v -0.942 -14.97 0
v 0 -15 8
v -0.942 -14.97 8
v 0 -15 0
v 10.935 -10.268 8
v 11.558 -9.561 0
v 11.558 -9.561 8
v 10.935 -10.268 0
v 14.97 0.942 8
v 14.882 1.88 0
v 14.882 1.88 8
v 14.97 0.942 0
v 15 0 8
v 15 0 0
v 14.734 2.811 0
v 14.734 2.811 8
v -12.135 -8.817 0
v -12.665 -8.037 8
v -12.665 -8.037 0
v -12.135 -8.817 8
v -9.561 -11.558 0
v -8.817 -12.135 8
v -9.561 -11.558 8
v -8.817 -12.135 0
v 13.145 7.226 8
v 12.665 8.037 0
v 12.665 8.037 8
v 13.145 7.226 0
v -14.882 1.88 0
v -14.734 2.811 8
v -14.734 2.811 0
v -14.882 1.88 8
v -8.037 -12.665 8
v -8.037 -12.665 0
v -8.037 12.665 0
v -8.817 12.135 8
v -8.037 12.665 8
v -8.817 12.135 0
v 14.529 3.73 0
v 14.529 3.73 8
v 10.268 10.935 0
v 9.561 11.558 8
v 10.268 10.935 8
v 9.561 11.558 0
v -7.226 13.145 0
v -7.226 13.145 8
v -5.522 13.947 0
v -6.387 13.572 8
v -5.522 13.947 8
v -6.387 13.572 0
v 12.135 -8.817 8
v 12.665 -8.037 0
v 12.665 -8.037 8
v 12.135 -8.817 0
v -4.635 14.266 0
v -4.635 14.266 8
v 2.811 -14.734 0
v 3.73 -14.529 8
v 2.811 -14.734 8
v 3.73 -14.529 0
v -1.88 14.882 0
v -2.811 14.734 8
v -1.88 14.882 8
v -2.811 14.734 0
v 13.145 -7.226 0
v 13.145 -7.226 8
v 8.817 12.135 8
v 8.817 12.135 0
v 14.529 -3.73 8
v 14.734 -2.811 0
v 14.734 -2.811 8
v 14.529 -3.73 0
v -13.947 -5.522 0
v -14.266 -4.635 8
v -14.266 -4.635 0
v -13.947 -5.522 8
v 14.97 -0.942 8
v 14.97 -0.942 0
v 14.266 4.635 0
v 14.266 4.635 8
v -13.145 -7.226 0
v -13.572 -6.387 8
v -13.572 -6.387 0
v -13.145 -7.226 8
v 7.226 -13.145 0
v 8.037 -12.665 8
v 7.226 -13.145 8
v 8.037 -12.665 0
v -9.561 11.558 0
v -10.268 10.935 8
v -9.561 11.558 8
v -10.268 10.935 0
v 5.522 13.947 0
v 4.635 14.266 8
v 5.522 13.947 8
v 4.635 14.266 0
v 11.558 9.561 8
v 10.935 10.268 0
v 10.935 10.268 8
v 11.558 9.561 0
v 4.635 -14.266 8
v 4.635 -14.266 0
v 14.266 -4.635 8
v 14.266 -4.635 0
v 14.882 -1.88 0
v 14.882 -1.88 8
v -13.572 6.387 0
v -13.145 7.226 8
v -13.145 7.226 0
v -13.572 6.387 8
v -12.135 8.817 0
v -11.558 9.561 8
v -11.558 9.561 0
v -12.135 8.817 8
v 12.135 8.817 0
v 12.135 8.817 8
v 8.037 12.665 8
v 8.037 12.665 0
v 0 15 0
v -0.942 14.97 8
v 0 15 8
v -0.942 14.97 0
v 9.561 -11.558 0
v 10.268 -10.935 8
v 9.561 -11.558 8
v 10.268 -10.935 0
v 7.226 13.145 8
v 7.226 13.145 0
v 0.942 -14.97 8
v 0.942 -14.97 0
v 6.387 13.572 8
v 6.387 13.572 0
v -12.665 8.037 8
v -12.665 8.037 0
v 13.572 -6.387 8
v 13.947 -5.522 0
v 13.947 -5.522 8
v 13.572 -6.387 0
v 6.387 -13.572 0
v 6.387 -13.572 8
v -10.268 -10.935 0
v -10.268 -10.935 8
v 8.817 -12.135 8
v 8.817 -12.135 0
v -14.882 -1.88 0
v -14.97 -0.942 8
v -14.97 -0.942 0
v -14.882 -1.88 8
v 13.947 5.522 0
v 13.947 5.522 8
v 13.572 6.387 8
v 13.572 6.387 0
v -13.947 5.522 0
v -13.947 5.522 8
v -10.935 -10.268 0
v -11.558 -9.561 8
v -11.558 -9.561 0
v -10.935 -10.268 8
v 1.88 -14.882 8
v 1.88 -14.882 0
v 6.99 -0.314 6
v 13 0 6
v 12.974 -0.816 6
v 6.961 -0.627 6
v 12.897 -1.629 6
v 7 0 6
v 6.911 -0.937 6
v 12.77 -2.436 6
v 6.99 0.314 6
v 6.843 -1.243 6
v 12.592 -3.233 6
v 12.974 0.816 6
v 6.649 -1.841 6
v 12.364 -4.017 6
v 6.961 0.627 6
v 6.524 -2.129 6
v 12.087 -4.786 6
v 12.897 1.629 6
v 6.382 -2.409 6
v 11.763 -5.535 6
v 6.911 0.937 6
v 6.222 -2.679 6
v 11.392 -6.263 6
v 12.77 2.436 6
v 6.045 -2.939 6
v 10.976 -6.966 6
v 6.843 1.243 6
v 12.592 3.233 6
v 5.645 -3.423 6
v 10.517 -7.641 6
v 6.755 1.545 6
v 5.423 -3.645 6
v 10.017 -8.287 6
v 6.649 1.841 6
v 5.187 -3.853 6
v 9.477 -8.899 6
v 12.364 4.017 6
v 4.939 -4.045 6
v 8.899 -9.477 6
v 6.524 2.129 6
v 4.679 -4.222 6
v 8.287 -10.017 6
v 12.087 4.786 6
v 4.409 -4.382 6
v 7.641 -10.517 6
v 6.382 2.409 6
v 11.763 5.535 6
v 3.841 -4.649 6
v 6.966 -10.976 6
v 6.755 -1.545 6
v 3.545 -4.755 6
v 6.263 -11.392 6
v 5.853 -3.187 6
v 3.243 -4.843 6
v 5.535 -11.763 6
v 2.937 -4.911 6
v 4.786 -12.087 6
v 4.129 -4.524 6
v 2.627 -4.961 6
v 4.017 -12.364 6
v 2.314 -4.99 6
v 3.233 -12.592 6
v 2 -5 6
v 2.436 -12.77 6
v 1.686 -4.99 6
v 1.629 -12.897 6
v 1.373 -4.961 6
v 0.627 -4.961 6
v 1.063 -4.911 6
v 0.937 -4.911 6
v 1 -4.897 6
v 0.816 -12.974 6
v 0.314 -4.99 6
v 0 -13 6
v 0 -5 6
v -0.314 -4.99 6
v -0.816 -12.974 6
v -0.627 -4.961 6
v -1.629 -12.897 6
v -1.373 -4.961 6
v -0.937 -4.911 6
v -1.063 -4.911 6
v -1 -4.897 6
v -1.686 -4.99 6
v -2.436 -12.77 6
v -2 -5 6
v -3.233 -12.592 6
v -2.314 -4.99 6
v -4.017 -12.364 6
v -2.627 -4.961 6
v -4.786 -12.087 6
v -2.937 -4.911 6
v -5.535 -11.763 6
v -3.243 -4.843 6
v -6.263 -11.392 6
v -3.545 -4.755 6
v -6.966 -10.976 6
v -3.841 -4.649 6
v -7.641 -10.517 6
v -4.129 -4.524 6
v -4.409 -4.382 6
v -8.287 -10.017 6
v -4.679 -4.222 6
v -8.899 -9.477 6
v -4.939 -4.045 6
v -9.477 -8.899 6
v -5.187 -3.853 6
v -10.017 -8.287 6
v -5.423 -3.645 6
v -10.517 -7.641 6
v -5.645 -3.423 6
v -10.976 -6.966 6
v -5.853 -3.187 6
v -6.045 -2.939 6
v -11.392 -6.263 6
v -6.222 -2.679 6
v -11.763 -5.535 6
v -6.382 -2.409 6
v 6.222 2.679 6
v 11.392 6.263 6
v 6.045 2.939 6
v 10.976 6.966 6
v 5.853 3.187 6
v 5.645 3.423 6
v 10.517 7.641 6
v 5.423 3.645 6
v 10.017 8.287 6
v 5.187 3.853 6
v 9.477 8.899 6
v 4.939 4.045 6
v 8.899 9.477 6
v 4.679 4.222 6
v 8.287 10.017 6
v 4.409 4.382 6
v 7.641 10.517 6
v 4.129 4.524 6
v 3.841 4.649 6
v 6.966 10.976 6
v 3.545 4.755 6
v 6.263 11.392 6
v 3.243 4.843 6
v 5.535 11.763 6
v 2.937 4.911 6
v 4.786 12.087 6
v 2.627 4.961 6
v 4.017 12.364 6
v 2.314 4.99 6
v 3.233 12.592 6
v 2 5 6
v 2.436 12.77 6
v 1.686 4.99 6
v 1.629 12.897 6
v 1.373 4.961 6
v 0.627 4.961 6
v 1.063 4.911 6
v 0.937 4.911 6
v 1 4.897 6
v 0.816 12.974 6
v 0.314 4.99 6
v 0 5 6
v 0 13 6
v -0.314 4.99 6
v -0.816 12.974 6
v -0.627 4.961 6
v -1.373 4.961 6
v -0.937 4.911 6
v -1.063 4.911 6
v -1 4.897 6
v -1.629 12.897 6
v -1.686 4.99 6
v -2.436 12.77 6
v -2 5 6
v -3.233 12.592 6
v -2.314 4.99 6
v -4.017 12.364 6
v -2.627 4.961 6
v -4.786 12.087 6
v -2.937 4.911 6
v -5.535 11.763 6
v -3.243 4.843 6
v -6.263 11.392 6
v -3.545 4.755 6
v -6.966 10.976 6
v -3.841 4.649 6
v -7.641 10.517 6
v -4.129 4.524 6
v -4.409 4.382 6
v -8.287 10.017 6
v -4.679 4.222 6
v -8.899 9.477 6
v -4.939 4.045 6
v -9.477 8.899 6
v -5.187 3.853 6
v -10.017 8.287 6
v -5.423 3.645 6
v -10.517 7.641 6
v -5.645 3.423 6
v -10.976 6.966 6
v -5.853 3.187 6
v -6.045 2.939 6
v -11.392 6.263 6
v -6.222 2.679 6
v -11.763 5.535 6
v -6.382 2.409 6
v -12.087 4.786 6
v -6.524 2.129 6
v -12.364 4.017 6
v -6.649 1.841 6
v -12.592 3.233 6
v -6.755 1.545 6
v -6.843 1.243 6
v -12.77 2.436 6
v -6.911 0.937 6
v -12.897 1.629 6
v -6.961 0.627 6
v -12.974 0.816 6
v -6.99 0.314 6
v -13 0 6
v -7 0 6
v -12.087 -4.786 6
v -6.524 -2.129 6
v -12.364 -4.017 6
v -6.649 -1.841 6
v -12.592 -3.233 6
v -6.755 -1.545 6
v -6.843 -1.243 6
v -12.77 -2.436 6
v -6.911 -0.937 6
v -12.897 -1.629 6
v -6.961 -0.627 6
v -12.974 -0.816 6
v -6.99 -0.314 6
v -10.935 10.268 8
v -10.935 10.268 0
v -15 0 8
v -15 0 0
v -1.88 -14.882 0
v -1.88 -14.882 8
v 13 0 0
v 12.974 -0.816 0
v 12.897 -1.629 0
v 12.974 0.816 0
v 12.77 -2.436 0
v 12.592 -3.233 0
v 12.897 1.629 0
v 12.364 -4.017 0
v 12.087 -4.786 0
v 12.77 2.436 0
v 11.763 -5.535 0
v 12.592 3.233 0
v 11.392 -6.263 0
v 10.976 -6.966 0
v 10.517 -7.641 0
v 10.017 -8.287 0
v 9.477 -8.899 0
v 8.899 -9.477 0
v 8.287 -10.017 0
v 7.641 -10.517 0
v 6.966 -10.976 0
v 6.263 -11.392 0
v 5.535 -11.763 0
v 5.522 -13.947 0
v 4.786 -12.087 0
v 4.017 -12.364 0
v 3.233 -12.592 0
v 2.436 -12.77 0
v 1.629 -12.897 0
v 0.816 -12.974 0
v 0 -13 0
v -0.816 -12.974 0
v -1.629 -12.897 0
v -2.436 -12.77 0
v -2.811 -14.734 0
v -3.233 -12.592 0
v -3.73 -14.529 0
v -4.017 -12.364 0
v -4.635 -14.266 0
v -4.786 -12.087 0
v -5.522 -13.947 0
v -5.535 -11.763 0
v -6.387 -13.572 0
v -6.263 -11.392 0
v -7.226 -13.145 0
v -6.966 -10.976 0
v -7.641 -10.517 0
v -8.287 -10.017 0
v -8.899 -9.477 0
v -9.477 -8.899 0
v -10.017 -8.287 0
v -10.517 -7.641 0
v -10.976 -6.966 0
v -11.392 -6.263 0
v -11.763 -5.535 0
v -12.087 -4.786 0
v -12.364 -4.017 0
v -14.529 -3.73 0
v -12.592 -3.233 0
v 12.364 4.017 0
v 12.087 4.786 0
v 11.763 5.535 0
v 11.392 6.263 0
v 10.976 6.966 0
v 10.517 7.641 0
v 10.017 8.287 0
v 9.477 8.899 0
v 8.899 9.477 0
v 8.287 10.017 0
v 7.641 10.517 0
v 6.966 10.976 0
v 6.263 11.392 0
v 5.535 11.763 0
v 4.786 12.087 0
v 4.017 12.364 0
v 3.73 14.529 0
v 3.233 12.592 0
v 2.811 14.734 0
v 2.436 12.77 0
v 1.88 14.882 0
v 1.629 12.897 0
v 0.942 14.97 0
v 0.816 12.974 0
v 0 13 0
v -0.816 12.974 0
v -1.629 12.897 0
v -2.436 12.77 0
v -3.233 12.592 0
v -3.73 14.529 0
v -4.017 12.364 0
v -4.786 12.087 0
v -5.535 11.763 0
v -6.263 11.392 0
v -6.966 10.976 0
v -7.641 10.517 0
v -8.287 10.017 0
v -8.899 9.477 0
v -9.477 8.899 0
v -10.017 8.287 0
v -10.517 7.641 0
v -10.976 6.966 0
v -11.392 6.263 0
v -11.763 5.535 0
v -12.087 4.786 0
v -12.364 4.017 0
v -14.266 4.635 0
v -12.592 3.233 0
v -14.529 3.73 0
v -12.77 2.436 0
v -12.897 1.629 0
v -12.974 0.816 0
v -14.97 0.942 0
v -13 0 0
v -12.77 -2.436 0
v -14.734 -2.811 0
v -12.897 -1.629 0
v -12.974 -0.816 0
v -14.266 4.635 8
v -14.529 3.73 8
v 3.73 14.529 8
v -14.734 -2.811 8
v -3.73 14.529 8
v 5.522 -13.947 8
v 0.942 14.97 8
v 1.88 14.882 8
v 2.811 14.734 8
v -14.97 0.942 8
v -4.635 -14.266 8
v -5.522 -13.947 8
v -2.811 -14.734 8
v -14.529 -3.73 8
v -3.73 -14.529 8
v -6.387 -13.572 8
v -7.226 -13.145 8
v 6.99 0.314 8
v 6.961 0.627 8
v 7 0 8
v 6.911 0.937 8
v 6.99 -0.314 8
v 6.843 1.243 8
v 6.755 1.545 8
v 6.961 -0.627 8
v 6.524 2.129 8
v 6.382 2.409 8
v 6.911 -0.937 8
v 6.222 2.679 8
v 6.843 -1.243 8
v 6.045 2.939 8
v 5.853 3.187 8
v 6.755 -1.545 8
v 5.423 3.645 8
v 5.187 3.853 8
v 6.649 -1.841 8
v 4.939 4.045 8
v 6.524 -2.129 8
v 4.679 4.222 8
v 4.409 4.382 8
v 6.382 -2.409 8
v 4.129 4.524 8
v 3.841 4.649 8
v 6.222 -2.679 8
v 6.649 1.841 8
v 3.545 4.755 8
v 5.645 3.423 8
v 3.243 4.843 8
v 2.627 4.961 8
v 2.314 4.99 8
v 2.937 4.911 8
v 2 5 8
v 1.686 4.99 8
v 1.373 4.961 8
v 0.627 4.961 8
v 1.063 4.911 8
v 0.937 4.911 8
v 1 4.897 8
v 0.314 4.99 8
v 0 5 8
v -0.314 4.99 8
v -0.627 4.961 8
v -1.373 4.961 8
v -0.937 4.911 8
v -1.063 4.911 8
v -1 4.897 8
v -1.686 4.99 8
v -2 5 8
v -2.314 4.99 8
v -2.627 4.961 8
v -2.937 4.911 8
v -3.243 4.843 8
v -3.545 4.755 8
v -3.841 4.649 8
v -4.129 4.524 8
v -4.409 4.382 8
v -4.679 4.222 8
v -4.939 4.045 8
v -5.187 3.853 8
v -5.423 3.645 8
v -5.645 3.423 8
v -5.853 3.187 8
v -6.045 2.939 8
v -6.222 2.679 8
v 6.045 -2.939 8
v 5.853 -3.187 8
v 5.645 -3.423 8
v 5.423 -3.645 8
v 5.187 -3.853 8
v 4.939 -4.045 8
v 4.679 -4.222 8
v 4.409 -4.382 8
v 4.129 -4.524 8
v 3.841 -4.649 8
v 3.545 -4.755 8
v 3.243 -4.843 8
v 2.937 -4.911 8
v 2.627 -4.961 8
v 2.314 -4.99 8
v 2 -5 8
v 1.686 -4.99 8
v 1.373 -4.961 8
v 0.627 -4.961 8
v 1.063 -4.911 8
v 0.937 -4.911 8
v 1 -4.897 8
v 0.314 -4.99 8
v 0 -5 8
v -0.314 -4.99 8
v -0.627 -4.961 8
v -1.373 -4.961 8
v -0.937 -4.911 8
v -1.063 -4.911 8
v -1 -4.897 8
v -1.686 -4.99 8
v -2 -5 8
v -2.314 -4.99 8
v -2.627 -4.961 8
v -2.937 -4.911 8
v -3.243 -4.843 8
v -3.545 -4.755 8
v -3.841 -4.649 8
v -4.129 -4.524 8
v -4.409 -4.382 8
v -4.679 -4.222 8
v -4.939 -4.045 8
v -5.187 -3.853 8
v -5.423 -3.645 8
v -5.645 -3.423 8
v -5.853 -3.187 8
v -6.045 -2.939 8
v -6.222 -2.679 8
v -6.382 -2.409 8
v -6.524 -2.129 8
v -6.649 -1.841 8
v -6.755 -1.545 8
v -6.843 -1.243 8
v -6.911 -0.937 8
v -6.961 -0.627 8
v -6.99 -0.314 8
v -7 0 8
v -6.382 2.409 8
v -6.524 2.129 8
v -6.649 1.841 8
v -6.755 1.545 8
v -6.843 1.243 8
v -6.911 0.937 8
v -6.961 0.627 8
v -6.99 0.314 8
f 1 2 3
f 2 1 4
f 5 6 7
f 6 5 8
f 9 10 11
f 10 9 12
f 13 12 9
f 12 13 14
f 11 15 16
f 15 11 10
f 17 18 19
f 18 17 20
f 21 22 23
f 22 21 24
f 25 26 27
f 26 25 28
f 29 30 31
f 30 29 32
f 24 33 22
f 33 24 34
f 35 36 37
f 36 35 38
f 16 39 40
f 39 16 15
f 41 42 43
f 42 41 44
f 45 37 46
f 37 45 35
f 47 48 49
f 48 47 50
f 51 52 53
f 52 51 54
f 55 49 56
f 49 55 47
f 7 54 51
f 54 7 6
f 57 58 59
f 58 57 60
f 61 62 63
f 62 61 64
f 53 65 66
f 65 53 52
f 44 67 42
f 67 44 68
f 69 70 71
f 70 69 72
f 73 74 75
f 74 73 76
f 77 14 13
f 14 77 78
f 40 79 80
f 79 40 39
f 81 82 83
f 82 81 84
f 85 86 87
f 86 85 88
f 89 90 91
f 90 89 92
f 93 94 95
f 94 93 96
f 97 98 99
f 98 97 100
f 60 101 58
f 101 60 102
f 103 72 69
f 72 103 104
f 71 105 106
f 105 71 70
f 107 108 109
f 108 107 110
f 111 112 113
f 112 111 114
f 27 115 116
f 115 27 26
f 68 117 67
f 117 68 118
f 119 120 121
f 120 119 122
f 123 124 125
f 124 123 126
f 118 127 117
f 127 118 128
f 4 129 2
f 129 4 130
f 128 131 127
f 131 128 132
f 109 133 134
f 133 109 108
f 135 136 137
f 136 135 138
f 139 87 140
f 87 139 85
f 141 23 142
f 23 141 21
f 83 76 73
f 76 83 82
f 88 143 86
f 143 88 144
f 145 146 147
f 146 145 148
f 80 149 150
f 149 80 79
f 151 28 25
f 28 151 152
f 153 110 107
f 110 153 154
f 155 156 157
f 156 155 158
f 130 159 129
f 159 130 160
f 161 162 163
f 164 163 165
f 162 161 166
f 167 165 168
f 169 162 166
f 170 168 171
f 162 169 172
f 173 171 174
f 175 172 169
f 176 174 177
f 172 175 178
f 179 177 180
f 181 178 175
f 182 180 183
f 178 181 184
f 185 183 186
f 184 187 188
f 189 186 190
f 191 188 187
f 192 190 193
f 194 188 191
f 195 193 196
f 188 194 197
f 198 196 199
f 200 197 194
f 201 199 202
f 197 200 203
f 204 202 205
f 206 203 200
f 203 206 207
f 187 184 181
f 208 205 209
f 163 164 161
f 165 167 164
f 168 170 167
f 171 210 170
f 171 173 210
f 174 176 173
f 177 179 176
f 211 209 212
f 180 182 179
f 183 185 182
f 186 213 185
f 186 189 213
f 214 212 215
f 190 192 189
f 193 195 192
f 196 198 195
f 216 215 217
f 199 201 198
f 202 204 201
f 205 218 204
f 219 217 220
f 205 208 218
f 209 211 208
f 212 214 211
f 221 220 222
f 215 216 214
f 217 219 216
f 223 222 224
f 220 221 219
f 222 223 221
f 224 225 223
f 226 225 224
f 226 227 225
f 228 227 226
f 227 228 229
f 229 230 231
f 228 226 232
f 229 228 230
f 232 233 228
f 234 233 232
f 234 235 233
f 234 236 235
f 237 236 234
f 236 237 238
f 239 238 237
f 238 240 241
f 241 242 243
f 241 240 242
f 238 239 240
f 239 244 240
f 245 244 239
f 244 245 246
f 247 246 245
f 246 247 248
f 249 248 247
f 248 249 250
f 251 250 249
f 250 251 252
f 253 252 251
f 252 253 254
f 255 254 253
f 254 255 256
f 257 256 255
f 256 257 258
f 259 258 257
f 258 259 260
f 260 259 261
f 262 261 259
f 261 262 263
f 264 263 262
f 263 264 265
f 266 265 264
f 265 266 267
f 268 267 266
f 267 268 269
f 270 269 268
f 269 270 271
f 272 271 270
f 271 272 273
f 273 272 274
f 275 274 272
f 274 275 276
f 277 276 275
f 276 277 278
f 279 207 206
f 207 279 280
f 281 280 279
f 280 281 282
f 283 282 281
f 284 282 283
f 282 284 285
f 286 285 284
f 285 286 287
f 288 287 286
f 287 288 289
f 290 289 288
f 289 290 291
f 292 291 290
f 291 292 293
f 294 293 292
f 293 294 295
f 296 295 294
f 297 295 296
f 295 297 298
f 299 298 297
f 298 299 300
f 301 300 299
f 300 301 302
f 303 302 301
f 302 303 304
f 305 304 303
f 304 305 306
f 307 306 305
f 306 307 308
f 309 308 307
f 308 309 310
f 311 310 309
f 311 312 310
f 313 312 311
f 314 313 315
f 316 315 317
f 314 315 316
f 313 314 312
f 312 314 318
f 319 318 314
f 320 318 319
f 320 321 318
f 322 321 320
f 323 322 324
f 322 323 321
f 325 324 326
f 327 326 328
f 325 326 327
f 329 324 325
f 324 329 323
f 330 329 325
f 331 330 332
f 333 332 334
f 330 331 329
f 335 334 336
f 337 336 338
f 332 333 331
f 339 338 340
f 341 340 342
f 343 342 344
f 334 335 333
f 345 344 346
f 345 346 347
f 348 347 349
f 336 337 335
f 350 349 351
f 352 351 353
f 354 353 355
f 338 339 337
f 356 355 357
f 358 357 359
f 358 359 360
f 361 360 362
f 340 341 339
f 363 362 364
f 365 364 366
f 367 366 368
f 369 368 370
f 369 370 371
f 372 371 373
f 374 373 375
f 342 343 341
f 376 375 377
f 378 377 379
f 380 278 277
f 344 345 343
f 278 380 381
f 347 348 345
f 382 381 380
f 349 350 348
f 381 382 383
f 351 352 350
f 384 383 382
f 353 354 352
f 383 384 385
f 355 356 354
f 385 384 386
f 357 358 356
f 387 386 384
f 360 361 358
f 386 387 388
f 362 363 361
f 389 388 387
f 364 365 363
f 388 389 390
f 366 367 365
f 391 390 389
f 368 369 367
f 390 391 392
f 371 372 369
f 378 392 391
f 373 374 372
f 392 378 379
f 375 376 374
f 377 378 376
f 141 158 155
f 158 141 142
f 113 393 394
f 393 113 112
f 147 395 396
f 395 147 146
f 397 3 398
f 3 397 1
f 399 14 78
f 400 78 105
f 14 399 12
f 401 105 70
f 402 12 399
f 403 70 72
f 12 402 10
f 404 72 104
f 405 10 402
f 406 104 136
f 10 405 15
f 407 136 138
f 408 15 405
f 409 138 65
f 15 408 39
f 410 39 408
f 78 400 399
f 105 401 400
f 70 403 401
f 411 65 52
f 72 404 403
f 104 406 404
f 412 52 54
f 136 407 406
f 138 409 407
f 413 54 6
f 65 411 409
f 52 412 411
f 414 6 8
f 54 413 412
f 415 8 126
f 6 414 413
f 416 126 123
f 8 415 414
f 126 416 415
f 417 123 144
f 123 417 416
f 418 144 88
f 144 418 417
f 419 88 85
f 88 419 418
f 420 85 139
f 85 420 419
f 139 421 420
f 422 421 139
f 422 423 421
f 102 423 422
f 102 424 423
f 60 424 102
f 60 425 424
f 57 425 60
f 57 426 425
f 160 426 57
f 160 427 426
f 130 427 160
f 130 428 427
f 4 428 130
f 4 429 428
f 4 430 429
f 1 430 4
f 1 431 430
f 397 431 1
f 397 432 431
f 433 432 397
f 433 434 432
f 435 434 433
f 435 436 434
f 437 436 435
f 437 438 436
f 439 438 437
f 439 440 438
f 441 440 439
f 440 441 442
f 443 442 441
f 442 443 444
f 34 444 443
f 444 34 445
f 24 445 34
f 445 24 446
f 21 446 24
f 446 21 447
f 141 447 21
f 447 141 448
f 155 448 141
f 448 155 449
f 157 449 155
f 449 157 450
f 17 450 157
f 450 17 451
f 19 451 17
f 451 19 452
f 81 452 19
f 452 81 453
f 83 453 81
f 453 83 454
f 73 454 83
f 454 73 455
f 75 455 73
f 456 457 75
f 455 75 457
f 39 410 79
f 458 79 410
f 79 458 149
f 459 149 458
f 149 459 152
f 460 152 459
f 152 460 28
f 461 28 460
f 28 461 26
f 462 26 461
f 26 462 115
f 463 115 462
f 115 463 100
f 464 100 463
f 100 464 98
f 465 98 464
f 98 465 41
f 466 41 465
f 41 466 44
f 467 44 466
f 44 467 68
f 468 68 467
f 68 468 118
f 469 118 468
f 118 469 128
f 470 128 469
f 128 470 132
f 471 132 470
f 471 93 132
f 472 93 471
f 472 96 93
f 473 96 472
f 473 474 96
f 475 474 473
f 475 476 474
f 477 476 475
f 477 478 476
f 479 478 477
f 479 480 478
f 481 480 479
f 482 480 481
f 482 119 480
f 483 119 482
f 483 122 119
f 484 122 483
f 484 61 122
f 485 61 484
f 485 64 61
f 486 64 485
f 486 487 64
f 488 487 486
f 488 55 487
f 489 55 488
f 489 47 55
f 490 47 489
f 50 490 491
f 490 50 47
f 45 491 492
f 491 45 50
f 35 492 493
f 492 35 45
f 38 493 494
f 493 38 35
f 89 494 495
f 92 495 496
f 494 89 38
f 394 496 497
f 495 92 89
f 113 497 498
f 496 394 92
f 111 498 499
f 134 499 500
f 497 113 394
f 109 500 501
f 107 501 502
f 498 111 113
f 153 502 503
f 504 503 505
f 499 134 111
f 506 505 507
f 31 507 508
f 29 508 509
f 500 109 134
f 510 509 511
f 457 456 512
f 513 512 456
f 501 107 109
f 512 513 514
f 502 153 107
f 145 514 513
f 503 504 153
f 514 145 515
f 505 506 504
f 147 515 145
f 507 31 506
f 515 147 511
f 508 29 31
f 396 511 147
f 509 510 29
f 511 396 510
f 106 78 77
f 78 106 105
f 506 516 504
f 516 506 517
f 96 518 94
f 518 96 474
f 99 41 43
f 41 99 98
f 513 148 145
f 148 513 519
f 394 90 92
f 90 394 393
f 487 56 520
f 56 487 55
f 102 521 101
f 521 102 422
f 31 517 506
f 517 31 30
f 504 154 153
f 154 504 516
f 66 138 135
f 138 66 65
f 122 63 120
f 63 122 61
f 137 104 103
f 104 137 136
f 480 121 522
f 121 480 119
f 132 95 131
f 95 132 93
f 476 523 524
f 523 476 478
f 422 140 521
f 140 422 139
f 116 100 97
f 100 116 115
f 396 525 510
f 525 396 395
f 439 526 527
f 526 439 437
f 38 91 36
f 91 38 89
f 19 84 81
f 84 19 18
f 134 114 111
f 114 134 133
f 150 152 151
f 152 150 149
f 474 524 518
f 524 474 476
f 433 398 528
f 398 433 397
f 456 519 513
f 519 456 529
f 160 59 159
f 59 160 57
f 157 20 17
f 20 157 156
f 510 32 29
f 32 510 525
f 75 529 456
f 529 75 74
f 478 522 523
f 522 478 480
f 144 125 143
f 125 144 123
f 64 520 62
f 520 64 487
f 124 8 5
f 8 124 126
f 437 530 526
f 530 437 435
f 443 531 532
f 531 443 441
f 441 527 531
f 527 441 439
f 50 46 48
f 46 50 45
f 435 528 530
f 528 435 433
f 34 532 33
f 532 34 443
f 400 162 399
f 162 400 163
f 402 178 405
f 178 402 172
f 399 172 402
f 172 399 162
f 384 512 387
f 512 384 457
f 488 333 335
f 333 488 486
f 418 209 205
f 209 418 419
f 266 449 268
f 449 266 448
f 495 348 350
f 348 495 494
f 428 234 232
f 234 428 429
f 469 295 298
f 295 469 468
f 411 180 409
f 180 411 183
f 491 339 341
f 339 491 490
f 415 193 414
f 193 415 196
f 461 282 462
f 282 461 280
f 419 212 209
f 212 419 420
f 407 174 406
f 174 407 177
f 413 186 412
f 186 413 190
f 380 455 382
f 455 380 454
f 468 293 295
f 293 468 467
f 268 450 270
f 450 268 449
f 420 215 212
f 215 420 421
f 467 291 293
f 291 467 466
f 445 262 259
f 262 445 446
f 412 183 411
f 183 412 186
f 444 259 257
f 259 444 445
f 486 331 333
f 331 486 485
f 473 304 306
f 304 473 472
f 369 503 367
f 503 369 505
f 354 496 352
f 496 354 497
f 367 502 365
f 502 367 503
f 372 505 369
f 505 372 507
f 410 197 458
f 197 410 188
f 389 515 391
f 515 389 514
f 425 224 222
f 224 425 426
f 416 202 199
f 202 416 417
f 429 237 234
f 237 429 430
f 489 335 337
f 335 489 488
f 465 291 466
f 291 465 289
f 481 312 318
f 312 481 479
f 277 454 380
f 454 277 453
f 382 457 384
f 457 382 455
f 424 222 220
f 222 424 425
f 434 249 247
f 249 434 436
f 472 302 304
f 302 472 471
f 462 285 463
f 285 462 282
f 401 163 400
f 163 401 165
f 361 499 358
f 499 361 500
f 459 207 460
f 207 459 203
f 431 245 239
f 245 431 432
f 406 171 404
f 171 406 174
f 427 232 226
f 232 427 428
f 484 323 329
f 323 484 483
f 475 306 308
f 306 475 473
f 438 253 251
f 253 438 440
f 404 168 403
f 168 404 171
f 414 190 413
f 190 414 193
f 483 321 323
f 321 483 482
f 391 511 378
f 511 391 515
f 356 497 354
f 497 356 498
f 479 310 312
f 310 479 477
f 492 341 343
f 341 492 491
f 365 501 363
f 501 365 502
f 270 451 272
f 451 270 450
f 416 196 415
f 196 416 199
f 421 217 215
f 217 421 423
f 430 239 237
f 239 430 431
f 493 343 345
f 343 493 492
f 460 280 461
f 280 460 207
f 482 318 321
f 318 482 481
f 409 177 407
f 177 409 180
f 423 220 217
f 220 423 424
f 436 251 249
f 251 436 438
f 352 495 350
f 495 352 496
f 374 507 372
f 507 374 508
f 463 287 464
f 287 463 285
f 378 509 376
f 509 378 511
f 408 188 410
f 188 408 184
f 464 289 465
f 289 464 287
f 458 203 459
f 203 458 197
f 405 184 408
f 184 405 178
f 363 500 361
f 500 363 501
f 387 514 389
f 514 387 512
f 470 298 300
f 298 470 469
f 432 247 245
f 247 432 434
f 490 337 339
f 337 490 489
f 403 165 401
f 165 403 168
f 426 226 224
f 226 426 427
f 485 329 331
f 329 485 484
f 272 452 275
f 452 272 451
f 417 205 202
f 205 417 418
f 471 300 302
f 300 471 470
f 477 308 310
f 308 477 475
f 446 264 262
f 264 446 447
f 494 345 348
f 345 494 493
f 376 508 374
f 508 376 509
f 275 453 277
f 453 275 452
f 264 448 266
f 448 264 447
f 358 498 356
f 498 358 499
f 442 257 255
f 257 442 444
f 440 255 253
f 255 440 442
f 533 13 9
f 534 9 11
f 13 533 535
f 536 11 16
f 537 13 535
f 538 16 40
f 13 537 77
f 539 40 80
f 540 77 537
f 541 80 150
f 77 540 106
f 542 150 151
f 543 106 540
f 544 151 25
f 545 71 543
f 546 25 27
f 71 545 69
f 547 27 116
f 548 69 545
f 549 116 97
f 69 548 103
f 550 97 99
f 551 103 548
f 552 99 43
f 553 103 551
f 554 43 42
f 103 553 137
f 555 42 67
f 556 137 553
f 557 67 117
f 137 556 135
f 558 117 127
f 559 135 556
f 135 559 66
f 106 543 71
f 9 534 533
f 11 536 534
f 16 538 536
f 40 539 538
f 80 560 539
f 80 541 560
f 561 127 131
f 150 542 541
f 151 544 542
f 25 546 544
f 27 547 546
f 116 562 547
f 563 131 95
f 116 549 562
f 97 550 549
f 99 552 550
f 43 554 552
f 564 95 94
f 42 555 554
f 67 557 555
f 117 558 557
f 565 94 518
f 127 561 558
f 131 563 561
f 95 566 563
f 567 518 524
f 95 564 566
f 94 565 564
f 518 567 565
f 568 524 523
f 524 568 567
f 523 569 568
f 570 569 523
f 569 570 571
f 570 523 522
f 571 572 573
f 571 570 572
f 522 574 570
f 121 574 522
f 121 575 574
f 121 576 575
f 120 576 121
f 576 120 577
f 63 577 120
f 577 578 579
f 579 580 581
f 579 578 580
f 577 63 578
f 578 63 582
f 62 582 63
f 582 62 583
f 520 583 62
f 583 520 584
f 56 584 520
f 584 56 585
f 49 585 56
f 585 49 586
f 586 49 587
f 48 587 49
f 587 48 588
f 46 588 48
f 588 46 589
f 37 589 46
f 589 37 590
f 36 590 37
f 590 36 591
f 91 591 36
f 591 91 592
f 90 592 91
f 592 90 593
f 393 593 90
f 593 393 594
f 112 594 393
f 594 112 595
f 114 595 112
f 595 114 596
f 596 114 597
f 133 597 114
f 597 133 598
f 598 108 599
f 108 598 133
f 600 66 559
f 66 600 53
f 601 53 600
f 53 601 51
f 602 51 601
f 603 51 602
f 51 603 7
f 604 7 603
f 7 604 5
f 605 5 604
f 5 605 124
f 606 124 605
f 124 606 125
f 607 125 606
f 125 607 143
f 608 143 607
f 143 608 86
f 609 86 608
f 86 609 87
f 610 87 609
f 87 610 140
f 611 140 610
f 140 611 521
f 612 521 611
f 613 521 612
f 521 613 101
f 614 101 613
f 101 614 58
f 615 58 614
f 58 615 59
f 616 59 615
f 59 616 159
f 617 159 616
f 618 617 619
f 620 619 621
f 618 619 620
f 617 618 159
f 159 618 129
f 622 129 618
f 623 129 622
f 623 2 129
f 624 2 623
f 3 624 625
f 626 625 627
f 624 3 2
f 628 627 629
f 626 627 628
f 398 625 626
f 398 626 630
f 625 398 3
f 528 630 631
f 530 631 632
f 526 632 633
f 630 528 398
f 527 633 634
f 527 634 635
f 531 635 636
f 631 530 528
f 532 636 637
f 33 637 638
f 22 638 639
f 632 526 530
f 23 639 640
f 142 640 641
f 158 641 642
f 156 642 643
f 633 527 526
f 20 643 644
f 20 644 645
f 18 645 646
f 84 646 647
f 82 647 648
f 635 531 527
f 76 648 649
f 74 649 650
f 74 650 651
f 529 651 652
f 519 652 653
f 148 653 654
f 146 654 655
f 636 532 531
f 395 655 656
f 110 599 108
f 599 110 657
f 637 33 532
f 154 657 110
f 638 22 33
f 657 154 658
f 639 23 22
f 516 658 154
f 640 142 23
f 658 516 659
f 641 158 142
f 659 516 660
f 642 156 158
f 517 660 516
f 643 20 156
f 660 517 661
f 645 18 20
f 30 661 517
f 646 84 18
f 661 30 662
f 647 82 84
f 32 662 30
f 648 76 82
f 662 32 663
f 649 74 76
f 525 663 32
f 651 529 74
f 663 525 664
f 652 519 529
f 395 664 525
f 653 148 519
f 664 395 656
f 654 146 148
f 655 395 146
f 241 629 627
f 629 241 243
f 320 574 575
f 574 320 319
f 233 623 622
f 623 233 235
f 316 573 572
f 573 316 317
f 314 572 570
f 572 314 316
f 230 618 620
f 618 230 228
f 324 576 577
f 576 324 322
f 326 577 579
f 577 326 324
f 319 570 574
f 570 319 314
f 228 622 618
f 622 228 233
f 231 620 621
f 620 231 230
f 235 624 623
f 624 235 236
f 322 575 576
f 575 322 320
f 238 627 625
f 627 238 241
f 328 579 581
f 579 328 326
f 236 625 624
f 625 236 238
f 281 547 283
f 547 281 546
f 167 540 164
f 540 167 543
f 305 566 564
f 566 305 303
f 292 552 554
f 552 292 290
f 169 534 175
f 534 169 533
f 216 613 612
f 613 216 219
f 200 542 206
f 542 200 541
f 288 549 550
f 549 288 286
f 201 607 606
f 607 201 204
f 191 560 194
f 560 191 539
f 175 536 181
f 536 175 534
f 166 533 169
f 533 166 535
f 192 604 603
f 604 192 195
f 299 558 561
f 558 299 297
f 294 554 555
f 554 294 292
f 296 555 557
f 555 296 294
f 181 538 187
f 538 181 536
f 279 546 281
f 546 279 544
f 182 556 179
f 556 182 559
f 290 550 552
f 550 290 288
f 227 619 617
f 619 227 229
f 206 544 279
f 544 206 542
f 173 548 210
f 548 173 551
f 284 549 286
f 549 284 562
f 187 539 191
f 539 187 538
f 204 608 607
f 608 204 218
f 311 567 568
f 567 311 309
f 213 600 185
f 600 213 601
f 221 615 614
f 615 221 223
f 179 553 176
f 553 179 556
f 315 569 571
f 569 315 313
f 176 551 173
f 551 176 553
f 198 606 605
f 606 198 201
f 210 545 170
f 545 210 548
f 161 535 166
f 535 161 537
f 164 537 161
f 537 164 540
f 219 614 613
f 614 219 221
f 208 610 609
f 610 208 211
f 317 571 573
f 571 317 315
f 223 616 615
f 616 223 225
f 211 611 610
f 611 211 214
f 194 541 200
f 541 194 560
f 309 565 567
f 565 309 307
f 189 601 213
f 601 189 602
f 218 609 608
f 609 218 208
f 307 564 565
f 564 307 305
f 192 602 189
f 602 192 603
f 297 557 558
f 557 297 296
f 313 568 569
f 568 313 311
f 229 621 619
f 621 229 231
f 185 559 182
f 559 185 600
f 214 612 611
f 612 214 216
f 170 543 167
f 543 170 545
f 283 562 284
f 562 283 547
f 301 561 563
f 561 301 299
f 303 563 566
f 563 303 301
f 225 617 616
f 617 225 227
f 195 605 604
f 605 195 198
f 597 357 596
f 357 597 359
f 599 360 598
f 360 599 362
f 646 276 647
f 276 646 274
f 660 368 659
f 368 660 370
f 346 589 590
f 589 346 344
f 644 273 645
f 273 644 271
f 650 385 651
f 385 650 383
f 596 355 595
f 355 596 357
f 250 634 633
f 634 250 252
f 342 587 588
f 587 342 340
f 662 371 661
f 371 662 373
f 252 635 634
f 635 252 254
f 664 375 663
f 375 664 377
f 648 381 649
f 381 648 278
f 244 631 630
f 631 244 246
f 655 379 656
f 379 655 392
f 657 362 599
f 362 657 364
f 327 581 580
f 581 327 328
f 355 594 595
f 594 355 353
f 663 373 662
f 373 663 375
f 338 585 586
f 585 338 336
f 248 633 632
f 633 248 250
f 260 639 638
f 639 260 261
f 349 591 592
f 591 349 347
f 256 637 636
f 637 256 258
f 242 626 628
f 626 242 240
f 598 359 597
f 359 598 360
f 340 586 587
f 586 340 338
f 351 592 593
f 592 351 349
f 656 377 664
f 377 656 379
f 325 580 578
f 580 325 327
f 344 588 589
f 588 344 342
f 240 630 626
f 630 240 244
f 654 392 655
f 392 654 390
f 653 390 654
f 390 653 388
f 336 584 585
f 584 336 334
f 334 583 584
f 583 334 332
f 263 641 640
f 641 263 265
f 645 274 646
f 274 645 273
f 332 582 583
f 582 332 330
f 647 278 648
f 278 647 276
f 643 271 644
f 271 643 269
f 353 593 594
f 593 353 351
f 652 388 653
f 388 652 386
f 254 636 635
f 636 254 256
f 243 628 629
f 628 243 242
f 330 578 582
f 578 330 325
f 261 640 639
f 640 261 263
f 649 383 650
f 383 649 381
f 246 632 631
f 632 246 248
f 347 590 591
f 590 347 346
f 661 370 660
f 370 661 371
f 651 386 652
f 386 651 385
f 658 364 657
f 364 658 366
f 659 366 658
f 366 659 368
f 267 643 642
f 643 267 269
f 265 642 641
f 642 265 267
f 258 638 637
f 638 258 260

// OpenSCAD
$fn=100; 
 difference() {
     cylinder(h=6, d=30);
     cylinder(h=6, d=26);
 }
translate([0,0,6]) {
    difference() {
     cylinder(h=2, d=30);
     cylinder(h=2, d=10);
     translate([2,0,0]) cylinder(h=2, d=10);
     translate([-2,0,0]) cylinder(h=2, d=10);
    } 
}
